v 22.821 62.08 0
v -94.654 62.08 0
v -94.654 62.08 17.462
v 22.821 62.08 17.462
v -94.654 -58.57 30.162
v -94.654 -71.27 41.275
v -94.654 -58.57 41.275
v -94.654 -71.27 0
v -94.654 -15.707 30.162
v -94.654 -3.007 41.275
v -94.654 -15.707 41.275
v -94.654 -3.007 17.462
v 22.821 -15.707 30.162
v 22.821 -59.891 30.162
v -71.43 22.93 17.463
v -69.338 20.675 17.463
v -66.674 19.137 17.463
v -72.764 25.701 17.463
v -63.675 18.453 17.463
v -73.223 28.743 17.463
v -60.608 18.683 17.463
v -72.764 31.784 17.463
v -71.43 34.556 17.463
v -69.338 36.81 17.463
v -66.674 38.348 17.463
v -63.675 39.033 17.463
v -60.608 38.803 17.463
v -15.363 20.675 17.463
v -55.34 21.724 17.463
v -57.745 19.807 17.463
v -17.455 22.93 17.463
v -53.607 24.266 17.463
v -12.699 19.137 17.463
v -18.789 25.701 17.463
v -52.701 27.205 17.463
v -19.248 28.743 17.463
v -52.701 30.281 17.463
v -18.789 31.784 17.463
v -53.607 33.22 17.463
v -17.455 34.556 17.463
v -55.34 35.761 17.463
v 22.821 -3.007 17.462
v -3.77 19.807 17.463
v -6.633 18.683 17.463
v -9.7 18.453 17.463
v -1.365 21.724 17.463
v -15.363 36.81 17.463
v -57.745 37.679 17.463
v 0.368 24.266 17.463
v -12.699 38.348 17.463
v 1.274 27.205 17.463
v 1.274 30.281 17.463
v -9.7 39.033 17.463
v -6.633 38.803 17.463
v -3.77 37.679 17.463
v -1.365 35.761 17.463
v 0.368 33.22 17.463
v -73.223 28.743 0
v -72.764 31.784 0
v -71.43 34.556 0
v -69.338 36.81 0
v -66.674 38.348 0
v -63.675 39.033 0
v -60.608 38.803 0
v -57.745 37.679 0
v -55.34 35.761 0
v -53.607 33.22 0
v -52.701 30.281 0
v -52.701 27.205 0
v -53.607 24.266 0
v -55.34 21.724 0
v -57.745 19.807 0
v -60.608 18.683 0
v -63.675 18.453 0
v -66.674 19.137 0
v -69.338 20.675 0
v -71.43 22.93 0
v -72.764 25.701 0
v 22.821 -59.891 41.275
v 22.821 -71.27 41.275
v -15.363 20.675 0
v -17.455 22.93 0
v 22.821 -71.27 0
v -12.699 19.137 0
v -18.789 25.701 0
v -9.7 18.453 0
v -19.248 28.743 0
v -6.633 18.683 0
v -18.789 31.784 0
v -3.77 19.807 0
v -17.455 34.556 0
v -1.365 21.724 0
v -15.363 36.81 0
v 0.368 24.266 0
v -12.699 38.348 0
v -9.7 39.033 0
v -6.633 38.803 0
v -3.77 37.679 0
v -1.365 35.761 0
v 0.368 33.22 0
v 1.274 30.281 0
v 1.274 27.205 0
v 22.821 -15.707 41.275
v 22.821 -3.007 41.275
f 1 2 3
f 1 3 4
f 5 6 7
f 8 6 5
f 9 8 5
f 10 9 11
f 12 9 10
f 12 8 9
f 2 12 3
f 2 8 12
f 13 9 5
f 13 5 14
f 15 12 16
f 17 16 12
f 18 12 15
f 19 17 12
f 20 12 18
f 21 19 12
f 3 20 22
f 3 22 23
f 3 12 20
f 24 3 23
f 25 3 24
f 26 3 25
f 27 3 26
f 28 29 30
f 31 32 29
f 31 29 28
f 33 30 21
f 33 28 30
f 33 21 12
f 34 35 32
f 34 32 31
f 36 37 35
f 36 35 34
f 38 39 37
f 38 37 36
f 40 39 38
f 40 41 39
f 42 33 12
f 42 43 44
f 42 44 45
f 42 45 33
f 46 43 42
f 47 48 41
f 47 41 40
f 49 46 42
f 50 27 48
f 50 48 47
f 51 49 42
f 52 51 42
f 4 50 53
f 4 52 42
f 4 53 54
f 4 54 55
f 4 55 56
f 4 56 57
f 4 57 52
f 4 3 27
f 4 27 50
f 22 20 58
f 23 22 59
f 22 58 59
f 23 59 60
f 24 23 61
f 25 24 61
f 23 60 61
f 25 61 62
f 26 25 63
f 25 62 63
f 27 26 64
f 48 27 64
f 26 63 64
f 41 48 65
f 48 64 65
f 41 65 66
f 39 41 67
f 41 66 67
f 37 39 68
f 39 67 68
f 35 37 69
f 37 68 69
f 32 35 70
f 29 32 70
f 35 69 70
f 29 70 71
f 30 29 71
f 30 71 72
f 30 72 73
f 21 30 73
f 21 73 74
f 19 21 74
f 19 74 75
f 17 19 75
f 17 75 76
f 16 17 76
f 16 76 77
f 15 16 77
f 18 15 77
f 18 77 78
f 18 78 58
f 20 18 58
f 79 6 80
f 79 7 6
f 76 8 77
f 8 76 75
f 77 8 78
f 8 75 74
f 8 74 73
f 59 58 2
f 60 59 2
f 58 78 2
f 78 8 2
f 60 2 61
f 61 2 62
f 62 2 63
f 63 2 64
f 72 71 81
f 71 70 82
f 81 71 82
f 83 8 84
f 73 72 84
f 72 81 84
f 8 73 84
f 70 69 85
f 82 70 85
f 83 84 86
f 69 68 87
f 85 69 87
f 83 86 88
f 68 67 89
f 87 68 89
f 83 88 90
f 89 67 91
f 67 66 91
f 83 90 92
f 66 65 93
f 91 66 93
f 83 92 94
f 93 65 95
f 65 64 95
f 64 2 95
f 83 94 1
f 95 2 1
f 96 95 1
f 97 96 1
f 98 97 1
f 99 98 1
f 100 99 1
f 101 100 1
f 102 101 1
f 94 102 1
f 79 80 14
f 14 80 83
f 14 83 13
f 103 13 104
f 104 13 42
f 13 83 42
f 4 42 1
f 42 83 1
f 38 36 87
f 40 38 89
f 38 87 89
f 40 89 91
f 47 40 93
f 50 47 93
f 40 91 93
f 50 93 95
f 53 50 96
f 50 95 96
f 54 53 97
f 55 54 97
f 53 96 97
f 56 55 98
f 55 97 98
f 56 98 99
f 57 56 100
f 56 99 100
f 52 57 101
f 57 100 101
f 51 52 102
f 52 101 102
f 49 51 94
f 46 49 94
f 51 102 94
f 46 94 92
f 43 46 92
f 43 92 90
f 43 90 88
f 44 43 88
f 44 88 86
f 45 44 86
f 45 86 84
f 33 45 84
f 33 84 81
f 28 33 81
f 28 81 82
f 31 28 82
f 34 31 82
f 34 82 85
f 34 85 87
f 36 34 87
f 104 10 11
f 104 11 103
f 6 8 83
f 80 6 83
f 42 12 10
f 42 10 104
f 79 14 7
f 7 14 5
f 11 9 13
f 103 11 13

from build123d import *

# Parameters (mm, degrees)
F0_W     = 117.475
F0_H     = 133.35
F1_DEPTH = 17.4625
F3_D     = 20.6375
F2_W     = 117.475
F2_H     = 68.2625
F4_DEPTH = 12.7
F5_W     = 117.475
F5_H     = 12.7
F6_DEPTH = 11.1125


with BuildPart() as f1:
    # F0 (on Top) → F1 (new body)
    with BuildSketch(Plane.XY):
        with Locations((-35.916665, -4.594561)):
            Rectangle(F0_W, F0_H)
    extrude(amount=F1_DEPTH)

    # F3 (through all)
    with Locations(Plane.XY.offset(17.4625)):
        with Locations((-62.904165, 28.742939), (-8.929165, 28.742939)):
            Hole(F3_D / 2)

    # F2 (on face) → F4 (join)
    with BuildSketch(Plane.XY.offset(17.4625)):
        with Locations((-35.916665, -37.138311)):
            Rectangle(F2_W, F2_H)
    extrude(amount=F4_DEPTH)

    # F5 (on face) → F6 (join)
    with BuildSketch(Plane.XY.offset(30.1625)):
        with Locations((-35.916665, -9.357061)):
            Rectangle(F5_W, F5_H)
        Polygon((-94.654165, -71.269561), (22.820835, -71.269561), (22.820835, -59.890952), (-94.654165, -58.569561), align=None)
    extrude(amount=F6_DEPTH)


solid = f1.part
